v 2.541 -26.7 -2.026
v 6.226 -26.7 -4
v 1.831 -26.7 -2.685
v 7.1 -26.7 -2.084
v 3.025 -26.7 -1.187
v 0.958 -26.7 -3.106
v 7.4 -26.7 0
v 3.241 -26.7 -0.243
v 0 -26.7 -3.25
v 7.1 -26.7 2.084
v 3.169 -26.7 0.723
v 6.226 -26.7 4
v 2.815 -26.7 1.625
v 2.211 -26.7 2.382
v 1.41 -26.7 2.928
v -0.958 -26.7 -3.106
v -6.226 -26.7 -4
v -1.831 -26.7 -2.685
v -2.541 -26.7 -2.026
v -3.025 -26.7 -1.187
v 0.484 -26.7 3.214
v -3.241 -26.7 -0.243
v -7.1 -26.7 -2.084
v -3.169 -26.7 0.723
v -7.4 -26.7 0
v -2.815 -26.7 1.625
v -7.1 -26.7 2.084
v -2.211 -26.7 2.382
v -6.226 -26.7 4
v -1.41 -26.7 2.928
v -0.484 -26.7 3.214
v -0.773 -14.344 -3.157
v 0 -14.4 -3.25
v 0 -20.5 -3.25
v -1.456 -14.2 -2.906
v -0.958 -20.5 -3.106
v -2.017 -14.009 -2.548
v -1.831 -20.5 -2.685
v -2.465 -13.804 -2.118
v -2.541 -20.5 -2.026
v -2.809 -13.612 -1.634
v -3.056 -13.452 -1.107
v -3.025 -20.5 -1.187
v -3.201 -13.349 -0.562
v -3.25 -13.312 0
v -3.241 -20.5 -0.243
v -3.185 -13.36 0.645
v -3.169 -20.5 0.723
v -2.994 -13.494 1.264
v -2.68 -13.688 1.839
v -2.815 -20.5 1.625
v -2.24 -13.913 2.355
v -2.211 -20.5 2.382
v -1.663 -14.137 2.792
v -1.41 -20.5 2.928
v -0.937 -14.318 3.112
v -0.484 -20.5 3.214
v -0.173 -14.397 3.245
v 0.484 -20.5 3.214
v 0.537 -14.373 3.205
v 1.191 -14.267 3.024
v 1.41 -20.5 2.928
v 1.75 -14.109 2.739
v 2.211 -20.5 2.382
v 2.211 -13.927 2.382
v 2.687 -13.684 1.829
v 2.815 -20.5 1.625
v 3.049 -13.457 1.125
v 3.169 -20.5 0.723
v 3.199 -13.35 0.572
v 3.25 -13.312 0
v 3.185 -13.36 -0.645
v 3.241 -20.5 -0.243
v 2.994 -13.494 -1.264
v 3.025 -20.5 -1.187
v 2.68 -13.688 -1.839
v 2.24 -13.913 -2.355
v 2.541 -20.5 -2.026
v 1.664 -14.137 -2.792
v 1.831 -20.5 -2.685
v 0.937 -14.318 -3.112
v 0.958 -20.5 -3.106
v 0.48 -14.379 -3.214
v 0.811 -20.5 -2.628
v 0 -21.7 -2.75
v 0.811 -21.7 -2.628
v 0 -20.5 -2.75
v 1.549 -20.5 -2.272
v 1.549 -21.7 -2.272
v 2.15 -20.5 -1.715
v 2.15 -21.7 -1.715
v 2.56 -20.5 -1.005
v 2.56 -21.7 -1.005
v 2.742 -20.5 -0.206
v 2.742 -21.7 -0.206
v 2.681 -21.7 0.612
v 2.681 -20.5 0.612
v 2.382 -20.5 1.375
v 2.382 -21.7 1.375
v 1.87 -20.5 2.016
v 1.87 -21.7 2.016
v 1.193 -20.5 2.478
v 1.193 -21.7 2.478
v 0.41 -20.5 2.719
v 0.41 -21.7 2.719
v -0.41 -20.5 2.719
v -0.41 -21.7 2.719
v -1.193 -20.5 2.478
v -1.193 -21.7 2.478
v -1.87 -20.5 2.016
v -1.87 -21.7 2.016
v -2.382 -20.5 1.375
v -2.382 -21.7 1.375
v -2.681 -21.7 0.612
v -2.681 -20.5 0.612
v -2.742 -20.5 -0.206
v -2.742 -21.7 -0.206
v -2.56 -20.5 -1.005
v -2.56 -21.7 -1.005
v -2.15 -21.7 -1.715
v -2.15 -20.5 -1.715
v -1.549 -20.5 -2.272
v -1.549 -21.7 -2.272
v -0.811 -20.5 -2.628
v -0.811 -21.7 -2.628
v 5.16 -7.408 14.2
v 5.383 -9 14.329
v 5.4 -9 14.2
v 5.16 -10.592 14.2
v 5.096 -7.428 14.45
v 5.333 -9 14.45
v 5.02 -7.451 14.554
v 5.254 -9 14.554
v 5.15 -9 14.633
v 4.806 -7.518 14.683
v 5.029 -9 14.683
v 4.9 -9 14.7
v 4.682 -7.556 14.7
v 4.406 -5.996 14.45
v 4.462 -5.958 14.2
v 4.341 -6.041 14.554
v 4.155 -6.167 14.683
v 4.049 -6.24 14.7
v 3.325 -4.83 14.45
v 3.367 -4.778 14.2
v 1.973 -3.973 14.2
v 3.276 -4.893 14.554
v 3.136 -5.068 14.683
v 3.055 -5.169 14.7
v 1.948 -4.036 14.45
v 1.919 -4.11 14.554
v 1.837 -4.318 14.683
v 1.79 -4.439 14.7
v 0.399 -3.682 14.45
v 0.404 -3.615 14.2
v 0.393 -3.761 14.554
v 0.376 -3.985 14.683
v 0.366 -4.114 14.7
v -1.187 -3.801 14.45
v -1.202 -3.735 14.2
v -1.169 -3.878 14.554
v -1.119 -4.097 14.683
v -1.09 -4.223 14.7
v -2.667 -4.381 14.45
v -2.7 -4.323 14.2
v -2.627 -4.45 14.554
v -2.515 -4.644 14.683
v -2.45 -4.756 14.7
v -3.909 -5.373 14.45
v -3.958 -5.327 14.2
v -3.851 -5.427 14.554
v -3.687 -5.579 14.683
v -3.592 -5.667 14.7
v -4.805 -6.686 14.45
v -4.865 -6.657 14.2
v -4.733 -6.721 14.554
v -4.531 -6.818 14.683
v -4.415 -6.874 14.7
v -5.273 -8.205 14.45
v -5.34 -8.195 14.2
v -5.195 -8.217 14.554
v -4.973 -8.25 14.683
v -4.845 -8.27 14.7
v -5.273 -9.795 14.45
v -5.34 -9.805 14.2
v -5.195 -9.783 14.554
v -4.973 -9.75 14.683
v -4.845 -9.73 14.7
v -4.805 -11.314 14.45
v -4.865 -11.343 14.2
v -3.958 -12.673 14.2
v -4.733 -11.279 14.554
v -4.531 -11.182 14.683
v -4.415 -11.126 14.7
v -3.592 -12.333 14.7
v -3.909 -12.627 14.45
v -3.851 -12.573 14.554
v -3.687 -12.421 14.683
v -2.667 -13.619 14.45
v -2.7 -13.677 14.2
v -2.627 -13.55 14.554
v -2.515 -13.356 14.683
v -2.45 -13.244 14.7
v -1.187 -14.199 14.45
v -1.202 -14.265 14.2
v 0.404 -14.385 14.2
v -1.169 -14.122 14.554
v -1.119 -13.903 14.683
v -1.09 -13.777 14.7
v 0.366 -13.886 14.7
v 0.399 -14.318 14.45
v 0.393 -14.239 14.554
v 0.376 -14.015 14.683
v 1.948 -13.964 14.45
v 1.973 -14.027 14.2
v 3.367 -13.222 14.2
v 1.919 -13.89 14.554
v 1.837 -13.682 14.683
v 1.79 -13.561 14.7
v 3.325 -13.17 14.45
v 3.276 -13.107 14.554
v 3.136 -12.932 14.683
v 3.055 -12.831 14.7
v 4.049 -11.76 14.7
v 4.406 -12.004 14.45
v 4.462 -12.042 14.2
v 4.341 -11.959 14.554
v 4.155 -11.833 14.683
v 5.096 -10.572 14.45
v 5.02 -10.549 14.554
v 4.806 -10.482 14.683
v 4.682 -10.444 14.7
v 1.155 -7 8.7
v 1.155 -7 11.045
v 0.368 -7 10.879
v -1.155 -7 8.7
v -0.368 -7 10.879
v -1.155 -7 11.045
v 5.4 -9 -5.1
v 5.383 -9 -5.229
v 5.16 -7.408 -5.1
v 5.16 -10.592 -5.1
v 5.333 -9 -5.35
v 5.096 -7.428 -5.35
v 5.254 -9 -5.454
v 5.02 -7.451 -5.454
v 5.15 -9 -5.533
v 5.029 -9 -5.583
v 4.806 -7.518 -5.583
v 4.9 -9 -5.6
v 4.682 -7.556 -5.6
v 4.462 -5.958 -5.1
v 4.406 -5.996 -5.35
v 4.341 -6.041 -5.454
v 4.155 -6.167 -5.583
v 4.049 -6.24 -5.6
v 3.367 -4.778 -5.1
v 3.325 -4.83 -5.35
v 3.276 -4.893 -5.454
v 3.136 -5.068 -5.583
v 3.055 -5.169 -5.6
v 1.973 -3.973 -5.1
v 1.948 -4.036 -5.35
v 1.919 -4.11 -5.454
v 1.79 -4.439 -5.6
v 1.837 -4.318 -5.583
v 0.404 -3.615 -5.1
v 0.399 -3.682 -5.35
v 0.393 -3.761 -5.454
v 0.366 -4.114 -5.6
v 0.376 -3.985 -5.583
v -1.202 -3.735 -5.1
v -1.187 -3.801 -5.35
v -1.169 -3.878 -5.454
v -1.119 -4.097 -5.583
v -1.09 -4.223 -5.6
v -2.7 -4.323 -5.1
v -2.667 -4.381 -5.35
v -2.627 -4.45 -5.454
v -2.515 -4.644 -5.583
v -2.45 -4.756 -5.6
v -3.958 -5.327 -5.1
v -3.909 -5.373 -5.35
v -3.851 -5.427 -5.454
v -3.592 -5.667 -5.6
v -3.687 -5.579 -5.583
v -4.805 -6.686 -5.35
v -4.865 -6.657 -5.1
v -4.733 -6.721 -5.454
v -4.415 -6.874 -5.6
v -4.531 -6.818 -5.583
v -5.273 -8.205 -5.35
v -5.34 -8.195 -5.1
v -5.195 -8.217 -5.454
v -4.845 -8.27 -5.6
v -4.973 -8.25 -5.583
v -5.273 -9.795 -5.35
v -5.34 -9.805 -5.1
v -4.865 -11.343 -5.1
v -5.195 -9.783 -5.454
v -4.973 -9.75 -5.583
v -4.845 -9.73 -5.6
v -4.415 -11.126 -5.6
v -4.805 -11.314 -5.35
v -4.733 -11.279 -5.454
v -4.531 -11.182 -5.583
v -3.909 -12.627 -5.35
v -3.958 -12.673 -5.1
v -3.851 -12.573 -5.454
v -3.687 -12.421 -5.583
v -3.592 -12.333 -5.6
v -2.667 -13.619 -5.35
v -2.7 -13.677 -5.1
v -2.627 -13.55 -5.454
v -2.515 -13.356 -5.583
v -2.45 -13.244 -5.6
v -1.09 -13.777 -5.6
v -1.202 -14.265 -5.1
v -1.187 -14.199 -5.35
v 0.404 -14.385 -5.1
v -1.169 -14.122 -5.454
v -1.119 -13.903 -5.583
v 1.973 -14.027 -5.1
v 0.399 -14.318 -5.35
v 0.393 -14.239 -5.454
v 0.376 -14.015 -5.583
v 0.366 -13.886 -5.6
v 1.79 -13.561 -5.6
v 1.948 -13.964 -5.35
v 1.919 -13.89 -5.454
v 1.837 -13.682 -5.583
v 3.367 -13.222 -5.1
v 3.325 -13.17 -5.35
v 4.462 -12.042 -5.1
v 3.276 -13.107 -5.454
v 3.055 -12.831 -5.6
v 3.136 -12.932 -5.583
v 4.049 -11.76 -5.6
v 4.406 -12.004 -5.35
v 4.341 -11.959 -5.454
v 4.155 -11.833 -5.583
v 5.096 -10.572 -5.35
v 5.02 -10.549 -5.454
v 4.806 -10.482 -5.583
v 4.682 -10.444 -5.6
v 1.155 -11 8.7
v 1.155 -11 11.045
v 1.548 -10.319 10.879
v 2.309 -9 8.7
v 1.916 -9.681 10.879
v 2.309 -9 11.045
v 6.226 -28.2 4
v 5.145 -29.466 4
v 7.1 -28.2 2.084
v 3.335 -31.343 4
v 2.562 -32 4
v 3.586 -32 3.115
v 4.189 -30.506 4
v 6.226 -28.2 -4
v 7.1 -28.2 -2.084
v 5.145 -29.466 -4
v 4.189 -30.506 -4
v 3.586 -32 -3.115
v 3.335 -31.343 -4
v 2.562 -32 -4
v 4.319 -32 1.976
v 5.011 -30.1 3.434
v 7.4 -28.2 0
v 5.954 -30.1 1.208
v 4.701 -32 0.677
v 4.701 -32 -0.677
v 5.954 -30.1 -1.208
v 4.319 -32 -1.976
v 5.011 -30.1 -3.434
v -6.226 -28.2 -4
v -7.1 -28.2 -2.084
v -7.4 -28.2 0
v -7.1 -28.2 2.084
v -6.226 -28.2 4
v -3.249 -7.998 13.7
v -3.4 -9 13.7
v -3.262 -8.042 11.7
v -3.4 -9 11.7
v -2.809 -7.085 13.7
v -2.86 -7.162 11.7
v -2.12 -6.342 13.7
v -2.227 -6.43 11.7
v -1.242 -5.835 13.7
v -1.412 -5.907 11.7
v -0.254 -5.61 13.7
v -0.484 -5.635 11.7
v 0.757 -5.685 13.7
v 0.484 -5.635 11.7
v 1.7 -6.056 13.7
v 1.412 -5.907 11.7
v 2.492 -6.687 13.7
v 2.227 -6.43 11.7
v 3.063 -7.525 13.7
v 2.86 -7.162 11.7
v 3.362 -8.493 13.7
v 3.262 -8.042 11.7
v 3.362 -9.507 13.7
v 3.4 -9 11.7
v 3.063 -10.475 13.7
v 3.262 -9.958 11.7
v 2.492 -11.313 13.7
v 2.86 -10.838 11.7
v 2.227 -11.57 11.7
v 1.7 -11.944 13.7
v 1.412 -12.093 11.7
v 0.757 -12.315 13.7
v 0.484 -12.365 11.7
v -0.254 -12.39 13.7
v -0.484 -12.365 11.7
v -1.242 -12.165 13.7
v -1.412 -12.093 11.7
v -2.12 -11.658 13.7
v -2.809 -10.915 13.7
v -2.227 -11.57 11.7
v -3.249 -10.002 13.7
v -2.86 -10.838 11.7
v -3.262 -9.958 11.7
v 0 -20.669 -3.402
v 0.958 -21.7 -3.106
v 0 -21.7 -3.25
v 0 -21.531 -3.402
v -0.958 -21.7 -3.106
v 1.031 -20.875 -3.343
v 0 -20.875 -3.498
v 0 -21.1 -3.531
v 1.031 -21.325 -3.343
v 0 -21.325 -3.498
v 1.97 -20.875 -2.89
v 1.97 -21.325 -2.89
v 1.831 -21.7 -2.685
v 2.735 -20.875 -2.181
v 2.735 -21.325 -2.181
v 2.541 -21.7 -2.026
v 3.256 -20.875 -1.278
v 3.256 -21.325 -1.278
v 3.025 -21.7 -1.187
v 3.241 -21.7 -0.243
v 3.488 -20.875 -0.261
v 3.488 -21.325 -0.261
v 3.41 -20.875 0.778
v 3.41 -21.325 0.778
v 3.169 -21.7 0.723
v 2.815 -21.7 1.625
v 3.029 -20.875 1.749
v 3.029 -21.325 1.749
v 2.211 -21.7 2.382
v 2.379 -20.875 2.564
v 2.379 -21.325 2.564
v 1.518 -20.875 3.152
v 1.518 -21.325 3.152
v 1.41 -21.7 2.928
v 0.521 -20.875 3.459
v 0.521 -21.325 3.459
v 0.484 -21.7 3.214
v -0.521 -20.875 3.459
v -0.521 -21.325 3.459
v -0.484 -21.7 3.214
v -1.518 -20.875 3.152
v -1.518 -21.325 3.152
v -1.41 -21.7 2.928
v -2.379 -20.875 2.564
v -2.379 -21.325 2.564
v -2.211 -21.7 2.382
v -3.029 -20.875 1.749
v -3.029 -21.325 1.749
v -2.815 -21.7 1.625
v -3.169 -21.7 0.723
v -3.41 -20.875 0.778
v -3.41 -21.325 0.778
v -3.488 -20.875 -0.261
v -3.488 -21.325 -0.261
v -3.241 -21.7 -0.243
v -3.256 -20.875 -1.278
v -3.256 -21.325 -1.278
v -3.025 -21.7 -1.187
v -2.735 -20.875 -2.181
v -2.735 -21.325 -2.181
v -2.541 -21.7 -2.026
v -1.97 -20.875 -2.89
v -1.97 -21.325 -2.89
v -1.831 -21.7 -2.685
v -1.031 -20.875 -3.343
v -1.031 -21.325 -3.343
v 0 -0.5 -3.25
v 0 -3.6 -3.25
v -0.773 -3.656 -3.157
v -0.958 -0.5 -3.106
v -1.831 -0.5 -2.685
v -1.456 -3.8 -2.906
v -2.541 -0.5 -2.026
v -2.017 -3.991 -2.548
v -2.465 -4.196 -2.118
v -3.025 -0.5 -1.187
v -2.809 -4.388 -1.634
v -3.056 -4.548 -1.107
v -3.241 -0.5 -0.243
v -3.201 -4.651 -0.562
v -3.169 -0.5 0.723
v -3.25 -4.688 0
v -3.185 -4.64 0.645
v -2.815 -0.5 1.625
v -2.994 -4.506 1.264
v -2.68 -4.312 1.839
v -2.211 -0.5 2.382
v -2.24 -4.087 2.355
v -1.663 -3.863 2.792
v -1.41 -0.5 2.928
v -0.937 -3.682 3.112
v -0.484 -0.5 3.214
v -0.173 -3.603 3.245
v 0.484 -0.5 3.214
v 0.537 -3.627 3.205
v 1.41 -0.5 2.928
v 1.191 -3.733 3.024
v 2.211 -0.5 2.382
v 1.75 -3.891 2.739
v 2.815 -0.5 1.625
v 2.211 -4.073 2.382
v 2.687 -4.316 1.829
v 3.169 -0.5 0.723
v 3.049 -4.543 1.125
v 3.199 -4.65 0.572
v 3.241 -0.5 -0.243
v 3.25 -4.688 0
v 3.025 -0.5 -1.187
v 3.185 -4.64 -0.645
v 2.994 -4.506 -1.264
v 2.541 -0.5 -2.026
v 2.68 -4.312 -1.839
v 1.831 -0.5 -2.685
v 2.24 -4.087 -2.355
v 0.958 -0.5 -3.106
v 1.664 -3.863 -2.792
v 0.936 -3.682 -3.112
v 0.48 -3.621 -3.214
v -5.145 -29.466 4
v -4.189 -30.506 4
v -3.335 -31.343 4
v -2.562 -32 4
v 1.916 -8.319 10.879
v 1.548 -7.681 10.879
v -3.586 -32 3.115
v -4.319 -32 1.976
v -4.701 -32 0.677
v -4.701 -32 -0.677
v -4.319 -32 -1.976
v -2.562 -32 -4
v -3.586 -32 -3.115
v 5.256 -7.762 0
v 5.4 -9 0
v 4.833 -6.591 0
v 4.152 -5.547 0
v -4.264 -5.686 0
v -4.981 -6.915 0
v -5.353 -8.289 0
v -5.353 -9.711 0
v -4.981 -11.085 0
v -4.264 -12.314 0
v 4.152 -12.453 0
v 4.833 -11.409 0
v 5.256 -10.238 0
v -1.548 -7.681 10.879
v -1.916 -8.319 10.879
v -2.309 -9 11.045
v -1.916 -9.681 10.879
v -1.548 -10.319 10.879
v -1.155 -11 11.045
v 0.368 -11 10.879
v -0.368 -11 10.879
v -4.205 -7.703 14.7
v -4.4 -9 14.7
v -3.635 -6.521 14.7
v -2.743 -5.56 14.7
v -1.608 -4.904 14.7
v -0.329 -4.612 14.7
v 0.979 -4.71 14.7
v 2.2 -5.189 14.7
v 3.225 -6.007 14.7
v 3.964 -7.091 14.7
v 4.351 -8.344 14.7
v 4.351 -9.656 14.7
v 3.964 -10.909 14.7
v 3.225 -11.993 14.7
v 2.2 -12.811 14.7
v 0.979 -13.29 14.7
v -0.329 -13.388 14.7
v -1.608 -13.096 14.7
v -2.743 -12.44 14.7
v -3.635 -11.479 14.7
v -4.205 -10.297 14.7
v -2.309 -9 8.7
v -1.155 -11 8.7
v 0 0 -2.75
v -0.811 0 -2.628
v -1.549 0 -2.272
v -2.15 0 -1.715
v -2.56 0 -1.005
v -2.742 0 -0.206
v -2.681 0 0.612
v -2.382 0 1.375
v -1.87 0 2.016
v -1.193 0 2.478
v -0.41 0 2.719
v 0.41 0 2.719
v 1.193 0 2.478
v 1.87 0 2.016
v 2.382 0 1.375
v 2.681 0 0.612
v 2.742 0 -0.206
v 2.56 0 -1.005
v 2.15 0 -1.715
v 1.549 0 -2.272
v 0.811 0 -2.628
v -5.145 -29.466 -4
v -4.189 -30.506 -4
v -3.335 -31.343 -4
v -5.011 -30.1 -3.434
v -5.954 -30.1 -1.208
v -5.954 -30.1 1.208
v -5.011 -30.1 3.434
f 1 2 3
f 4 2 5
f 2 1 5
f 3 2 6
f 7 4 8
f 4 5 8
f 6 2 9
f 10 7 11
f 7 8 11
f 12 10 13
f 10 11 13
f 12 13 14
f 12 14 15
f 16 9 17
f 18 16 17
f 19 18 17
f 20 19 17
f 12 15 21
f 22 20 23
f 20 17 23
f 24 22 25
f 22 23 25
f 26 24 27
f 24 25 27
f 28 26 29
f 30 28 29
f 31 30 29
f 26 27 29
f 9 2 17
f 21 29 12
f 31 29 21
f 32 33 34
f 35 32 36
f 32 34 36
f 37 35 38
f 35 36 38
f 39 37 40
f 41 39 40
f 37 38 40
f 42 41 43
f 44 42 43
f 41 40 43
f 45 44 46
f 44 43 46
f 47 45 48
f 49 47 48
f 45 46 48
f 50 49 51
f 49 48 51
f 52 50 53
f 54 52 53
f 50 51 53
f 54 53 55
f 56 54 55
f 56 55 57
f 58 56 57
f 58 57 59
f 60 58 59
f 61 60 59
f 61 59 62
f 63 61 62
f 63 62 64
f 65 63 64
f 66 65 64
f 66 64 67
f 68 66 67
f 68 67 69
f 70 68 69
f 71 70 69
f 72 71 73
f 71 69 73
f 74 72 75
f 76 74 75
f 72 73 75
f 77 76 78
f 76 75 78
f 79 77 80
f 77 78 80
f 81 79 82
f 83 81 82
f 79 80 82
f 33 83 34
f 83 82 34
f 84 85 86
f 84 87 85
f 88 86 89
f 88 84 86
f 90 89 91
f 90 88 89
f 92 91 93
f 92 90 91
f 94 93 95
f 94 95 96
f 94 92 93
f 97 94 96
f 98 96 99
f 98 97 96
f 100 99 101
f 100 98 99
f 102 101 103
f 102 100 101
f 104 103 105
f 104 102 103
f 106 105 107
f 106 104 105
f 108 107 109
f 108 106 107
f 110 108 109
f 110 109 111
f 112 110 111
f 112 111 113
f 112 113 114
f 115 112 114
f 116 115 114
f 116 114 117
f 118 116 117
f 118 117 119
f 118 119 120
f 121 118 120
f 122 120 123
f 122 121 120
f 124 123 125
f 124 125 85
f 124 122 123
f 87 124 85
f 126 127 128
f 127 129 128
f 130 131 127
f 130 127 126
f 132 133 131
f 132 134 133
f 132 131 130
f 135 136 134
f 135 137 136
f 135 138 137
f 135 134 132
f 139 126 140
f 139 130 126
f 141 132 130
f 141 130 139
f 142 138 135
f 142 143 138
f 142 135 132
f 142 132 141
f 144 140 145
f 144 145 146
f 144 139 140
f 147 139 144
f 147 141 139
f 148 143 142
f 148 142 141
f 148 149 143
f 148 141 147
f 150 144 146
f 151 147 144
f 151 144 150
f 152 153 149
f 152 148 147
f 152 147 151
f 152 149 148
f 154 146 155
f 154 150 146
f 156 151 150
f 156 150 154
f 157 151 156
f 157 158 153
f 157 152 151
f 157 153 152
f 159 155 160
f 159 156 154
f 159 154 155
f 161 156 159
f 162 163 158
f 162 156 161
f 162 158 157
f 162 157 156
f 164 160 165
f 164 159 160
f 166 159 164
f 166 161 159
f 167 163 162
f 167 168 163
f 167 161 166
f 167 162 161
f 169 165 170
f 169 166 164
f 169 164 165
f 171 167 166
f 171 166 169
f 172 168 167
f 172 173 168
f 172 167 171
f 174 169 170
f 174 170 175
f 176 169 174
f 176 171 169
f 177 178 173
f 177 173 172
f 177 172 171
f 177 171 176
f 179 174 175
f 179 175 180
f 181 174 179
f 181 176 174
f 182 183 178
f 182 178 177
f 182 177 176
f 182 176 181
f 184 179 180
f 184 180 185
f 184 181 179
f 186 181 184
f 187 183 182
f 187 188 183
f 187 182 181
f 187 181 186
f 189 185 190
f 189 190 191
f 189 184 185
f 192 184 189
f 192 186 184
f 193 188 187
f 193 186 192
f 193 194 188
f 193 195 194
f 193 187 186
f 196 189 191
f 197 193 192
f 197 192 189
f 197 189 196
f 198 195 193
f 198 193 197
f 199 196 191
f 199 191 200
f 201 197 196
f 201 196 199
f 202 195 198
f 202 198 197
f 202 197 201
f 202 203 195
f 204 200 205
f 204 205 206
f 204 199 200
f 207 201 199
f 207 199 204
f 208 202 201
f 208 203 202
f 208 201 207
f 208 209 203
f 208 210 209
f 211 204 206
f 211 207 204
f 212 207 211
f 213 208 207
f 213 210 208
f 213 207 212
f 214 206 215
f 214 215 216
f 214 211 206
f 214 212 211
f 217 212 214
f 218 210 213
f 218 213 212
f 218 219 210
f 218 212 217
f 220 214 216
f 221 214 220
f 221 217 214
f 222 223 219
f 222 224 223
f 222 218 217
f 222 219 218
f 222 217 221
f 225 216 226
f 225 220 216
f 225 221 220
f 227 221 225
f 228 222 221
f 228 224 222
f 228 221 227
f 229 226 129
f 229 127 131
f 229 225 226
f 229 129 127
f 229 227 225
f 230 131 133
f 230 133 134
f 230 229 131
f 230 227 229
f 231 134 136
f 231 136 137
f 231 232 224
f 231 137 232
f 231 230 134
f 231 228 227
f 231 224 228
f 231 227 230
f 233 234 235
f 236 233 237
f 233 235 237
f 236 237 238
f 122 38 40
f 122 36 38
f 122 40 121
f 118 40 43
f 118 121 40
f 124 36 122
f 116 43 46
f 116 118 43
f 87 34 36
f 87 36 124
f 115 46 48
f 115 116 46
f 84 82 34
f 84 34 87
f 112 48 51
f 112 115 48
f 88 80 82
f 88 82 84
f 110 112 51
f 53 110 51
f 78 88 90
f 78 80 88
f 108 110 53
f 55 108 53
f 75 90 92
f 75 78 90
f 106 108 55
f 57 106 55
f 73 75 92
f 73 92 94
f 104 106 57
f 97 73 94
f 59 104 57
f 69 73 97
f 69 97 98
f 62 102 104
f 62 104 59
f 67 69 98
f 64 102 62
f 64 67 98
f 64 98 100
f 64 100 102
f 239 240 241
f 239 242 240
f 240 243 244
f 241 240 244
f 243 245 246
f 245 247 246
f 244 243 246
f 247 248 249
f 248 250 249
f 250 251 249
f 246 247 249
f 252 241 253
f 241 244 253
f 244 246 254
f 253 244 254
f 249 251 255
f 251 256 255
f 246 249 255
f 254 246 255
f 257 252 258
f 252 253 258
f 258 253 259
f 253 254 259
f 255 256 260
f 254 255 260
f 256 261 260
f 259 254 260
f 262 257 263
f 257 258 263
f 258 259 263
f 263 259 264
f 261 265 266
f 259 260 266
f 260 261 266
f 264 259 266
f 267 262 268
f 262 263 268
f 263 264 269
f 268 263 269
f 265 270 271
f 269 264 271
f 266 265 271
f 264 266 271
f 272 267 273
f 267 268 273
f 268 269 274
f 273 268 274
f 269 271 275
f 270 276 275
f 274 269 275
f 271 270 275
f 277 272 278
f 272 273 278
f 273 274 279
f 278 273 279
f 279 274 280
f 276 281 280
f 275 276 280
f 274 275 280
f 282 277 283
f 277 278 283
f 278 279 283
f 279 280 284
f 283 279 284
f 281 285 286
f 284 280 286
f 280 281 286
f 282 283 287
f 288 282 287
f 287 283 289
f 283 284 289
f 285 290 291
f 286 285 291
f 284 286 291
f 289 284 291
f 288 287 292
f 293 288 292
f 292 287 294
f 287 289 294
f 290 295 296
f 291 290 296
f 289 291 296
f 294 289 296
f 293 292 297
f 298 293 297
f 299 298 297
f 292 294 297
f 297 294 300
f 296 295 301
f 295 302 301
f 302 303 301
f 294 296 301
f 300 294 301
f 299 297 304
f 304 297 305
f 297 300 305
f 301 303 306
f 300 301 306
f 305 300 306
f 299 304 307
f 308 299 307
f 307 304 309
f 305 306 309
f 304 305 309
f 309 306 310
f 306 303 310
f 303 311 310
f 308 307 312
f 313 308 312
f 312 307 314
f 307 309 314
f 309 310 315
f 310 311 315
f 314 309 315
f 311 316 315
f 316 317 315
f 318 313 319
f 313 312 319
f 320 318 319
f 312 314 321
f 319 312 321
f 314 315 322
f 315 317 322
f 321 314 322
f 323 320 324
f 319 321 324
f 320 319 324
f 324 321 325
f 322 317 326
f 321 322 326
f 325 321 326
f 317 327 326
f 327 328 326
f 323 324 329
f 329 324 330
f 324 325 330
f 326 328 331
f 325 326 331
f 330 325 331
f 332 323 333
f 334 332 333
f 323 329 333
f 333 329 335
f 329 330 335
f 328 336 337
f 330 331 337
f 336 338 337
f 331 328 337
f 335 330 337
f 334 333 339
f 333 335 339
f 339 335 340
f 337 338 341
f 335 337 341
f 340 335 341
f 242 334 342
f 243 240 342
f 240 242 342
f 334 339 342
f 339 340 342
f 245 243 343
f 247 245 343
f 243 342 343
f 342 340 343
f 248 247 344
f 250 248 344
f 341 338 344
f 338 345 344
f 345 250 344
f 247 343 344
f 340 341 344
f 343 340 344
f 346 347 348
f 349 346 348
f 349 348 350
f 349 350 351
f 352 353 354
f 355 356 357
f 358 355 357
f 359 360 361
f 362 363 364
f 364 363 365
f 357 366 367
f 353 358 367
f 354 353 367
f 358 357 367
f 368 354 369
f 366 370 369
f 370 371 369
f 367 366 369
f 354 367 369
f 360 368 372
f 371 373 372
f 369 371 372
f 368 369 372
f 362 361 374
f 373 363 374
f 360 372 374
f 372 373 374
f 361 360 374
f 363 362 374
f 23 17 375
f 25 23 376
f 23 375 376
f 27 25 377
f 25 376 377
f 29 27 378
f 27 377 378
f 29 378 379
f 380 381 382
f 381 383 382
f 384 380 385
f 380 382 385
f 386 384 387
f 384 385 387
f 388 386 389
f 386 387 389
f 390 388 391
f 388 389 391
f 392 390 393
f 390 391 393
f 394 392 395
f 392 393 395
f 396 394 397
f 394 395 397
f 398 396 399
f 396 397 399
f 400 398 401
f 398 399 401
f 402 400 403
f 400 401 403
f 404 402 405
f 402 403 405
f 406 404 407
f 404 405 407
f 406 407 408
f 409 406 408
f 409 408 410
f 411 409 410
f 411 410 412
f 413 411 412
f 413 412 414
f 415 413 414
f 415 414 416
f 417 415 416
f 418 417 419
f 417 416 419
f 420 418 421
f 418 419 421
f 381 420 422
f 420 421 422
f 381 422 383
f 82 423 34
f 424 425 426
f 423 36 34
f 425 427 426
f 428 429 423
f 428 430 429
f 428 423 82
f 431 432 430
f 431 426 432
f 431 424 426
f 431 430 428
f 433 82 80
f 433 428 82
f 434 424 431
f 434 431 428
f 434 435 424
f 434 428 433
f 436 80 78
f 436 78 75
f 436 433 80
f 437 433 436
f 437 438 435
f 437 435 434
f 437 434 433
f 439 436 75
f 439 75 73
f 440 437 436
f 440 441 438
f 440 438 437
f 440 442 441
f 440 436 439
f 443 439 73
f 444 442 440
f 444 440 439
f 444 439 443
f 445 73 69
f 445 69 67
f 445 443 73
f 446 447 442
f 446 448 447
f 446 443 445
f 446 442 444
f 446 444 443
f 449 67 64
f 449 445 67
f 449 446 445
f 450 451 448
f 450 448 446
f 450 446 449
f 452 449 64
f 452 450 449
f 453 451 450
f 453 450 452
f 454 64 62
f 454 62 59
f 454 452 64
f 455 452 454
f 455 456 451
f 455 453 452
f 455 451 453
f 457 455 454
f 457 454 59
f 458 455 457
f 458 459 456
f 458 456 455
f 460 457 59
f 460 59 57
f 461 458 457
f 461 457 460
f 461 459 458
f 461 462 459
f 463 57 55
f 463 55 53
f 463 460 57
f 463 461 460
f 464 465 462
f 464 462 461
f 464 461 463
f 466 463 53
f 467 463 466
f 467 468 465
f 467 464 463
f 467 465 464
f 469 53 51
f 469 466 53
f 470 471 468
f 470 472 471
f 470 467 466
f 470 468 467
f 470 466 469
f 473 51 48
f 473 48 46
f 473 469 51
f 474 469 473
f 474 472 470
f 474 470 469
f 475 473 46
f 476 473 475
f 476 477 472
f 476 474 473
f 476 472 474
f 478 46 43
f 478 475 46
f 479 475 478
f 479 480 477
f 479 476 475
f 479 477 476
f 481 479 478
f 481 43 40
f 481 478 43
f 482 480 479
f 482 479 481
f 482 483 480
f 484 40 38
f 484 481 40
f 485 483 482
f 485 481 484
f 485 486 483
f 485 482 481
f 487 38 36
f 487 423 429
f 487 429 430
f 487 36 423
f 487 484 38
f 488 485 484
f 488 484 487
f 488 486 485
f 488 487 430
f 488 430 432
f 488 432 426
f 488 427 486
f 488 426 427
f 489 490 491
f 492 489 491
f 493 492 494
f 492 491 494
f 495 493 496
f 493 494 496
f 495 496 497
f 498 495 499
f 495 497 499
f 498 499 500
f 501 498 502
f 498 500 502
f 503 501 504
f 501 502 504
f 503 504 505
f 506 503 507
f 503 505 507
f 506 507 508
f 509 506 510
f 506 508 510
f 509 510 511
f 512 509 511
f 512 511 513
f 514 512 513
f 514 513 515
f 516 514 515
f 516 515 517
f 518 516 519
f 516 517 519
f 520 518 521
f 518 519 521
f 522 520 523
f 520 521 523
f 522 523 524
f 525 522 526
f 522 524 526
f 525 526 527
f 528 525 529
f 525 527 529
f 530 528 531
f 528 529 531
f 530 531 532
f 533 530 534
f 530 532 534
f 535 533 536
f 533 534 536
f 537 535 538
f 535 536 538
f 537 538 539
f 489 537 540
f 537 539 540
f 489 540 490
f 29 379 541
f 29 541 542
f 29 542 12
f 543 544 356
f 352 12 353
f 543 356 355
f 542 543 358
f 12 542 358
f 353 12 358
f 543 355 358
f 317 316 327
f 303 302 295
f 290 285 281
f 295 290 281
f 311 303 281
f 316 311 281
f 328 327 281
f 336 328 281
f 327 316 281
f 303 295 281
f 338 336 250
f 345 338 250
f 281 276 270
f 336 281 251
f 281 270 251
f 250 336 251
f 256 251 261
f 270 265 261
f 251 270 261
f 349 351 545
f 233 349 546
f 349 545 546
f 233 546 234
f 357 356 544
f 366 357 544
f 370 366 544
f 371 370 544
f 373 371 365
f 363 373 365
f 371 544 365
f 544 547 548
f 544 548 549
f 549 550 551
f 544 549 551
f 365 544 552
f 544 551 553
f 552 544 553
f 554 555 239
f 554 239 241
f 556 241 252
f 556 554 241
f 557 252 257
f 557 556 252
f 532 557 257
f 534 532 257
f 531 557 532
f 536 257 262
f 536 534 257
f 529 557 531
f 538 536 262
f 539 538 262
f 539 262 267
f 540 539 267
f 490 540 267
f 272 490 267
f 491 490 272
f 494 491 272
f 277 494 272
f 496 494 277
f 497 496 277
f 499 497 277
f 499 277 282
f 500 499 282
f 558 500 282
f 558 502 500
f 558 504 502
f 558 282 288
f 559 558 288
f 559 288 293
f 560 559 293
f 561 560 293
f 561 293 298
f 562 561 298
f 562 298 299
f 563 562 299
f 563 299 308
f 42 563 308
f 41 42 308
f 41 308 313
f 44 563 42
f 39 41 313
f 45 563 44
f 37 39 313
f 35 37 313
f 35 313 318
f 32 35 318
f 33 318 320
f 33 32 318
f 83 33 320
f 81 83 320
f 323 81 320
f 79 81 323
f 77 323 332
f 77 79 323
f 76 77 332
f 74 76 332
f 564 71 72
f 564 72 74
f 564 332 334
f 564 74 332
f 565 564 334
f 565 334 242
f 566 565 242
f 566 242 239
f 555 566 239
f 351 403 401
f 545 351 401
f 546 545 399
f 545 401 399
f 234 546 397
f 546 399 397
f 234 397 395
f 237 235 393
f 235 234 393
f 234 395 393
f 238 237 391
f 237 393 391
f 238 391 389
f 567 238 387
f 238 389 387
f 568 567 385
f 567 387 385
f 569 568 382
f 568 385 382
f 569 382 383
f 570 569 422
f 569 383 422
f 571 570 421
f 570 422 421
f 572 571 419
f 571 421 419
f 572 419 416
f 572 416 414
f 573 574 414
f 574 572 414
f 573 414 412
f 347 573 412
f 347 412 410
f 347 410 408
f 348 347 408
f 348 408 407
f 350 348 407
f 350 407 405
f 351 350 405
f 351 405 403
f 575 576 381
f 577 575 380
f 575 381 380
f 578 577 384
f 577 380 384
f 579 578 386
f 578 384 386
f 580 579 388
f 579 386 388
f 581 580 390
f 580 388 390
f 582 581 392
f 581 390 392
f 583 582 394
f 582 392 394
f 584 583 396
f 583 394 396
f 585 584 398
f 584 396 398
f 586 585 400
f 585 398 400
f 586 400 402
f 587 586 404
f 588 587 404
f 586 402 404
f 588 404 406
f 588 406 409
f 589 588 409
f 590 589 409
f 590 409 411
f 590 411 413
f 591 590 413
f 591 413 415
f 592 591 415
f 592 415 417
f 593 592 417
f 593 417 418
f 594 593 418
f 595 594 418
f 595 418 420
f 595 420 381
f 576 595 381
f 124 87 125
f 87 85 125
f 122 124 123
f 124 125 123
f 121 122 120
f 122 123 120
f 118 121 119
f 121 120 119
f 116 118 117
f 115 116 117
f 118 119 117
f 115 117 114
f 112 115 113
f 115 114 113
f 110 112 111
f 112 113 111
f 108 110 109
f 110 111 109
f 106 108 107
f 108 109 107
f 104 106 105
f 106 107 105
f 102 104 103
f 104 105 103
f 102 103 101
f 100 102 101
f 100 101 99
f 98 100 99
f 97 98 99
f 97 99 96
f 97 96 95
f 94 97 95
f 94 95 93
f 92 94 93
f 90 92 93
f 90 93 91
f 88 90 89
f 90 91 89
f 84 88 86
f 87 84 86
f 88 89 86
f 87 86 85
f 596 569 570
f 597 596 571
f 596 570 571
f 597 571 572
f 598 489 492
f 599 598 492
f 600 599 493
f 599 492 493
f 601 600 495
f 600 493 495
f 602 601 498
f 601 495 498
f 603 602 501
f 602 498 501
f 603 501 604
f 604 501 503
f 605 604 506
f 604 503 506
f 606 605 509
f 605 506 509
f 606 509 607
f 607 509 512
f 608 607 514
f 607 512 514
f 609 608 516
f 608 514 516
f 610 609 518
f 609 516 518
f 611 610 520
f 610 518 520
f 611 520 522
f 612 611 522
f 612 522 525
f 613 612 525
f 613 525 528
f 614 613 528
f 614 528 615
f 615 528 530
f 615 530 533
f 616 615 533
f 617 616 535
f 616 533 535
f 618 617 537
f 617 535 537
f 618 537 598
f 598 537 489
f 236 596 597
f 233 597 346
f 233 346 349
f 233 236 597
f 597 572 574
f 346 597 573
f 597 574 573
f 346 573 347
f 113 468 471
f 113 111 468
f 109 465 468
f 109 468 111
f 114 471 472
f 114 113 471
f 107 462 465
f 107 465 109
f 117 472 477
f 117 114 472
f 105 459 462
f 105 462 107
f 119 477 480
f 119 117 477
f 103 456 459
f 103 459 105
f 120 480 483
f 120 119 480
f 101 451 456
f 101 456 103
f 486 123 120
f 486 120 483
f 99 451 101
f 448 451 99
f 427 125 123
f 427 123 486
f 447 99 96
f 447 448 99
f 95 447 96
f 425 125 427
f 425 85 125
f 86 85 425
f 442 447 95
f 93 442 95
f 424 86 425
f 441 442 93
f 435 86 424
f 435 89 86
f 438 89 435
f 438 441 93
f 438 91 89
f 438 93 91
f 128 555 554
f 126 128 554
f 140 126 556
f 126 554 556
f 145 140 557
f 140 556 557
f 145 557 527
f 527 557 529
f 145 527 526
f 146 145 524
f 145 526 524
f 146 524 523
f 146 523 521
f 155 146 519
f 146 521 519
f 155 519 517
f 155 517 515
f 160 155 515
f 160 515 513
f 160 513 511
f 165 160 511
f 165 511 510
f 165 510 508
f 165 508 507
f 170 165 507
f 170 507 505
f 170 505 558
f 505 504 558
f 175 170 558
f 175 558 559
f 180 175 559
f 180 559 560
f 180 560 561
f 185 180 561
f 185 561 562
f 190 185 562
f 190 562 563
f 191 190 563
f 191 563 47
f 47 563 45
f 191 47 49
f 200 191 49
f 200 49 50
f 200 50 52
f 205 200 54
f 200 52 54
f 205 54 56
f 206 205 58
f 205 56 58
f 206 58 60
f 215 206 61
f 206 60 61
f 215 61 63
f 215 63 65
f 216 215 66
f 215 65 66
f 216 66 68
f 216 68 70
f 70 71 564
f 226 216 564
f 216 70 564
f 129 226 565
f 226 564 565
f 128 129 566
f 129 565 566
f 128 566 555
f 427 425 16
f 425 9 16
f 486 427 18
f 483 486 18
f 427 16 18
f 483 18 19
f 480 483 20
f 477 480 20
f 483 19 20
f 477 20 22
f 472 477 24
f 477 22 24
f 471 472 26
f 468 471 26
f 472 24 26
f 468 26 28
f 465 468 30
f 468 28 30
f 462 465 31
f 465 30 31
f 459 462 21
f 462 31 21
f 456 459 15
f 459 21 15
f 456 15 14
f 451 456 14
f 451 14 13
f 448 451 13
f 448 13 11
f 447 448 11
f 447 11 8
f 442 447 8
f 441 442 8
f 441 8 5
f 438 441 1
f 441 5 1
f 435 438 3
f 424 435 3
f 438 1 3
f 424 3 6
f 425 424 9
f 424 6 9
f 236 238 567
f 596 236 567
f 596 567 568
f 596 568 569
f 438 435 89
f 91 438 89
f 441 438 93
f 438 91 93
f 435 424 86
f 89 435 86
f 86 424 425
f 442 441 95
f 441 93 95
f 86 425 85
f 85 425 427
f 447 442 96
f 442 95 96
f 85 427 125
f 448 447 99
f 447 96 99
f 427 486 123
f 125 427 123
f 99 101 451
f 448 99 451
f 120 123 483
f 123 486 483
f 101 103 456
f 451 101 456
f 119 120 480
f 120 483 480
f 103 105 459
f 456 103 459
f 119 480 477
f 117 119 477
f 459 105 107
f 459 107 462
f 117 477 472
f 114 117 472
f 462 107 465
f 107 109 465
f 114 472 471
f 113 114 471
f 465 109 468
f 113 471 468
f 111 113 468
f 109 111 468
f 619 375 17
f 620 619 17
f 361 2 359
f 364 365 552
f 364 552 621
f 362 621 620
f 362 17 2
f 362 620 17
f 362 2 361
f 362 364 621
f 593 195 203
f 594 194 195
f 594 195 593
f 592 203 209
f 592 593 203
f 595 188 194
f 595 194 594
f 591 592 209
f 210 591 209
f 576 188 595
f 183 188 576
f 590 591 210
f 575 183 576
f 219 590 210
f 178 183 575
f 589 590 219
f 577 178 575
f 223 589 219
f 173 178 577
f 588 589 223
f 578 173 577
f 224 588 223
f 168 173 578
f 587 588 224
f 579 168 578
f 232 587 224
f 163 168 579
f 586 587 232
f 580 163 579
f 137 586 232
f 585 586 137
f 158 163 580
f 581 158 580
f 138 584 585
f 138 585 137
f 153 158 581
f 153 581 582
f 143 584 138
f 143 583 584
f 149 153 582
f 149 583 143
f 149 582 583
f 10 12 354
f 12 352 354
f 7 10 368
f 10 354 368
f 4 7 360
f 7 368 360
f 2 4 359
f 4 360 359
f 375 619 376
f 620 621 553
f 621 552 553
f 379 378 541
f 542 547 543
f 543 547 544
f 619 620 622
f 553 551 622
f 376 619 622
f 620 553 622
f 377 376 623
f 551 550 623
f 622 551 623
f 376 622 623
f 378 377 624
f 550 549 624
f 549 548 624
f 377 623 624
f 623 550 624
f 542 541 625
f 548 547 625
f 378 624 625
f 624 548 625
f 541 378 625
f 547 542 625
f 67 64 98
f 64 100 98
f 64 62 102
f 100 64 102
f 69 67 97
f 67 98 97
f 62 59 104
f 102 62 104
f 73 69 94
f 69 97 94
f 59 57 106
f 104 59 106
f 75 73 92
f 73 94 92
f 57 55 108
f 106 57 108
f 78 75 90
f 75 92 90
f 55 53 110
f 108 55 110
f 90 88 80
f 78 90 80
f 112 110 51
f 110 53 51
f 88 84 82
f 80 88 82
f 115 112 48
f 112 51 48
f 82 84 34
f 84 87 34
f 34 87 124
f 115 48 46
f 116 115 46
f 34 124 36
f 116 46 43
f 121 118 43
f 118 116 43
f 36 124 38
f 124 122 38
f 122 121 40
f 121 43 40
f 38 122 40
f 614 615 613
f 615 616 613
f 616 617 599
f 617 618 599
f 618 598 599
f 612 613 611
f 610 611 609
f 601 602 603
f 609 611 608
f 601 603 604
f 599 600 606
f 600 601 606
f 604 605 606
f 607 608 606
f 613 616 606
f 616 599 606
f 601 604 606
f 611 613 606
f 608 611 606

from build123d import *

# Parameters (mm, degrees)
SKETCH_6_OUTSIDE_W          = 24.448
SKETCH_6_OUTSIDE_H          = 24.448
SKETCH_6_OUTSIDE_W_2        = 14.8
SKETCH_6_OUTSIDE_H_2        = 8
CUT_EXTRUDE_1_DEPTH         = 5.3
CHAMFER_1_SIZE              = 0.5
SKETCH_12_R                 = 5.4
EXTRUDE_2_DEPTH             = 14.7
EXTRUDE_2_DEPTH_BACK        = 5.6
HOLE_WIZARD_M81_D           = 6.8
HOLE_WIZARD_M81_DEPTH       = 3
HOLE_WIZARD_M81_CSINK_D     = 8.8
HOLE_WIZARD_M81_CSINK_ANGLE = 90
HOLE_WIZARD_M81_TIP         = 2.042926105
FILLET_1_R                  = 0.5
CUT_EXTRUDE_2_DEPTH         = 6


with BuildPart() as part:
    # Эскиз3 → Повернуть1 (revolve)
    with BuildSketch(Plane.XY, mode=Mode.PRIVATE) as revolve_1_sk:
        Polygon((0, 0), (-3.25, 0), (-3.25, -20.5), (-2.75, -20.5), (-2.75, -21.7), (-3.25, -21.7), (-3.25, -26.7), (-7.4, -26.7), (-7.4, -28.2), (-4.75, -32), (0, -32), align=None)
    revolve(revolve_1_sk.sketch.rotate(Axis((0, 0, 0), (0, 1, 0)), 270), axis=Axis((0, 0, 0), (0, 1, 0)))  # turned: the seam where the file's is

    # Эскиз6 outside → Вырез-Вытянуть1 (cut)
    with BuildSketch(Plane.XZ.offset(32)):
        Rectangle(SKETCH_6_OUTSIDE_W, SKETCH_6_OUTSIDE_H)
        Rectangle(SKETCH_6_OUTSIDE_W_2, SKETCH_6_OUTSIDE_H_2, mode=Mode.SUBTRACT)
    extrude(amount=-CUT_EXTRUDE_1_DEPTH, mode=Mode.SUBTRACT)

    # Фаска1
    chamfer_1_edges = [part.edges().sort_by_distance(p)[0] for p in [
        (0, 0, 3.25),
    ]]
    chamfer(chamfer_1_edges, length=CHAMFER_1_SIZE)

    # Эскиз12 → Бобышка-Вытянуть2 (add, two sides)
    with BuildSketch(Plane.XY) as extrude_2_sk:
        with Locations((0, -9)):
            Circle(SKETCH_12_R)
    extrude(amount=EXTRUDE_2_DEPTH)
    extrude(extrude_2_sk.sketch, amount=-EXTRUDE_2_DEPTH_BACK)

    # Отверстие обработанное метчиком M81
    with Locations(Plane.XY.offset(14.7)):
        with Locations((0, -9)):
            CounterSinkHole(HOLE_WIZARD_M81_D / 2, HOLE_WIZARD_M81_CSINK_D / 2, depth=HOLE_WIZARD_M81_DEPTH, counter_sink_angle=HOLE_WIZARD_M81_CSINK_ANGLE)
            with Locations((0, 0, -(HOLE_WIZARD_M81_DEPTH + HOLE_WIZARD_M81_TIP / 2))):  # 118° drill point
                Cone(0, HOLE_WIZARD_M81_D / 2, HOLE_WIZARD_M81_TIP, mode=Mode.SUBTRACT)

    # Скругление1
    fillet_1_edges = [part.edges().sort_by_distance(p)[0] for p in [
        (-5.4, -9, -5.6),
        (-5.4, -9, 14.7),
    ]]
    fillet(fillet_1_edges, radius=FILLET_1_R)

    # Эскиз15 → Вырез-Вытянуть2 (cut)
    with BuildSketch(Plane.XY.offset(14.7)):
        Polygon((2.309401077, -9), (1.154700538, -7), (-1.154700538, -7), (-2.309401077, -9), (-1.154700538, -11), (1.154700538, -11), align=None)
    extrude(amount=-CUT_EXTRUDE_2_DEPTH, mode=Mode.SUBTRACT)


with BuildPart() as body_2:
    # Эскиз16 → Повернуть2 (revolve)
    with BuildSketch(Plane.XY, mode=Mode.PRIVATE) as revolve_2_sk:
        with BuildLine():
            Line((-2.75, -20.5), (-3.25, -20.5))
            ThreePointArc((-3.25, -20.5), (-3.531024968, -21.1), (-3.25, -21.7))
            Line((-3.25, -21.7), (-2.75, -21.7))
            Line((-2.75, -21.7), (-2.75, -20.5))
        make_face()
    revolve(revolve_2_sk.sketch.rotate(Axis((0, -20.5, 0), (0, -1, 0)), 90), axis=Axis((0, -20.5, 0), (0, -1, 0)))  # turned: the seam where the file's is


solid = Compound([part.part, body_2.part])
